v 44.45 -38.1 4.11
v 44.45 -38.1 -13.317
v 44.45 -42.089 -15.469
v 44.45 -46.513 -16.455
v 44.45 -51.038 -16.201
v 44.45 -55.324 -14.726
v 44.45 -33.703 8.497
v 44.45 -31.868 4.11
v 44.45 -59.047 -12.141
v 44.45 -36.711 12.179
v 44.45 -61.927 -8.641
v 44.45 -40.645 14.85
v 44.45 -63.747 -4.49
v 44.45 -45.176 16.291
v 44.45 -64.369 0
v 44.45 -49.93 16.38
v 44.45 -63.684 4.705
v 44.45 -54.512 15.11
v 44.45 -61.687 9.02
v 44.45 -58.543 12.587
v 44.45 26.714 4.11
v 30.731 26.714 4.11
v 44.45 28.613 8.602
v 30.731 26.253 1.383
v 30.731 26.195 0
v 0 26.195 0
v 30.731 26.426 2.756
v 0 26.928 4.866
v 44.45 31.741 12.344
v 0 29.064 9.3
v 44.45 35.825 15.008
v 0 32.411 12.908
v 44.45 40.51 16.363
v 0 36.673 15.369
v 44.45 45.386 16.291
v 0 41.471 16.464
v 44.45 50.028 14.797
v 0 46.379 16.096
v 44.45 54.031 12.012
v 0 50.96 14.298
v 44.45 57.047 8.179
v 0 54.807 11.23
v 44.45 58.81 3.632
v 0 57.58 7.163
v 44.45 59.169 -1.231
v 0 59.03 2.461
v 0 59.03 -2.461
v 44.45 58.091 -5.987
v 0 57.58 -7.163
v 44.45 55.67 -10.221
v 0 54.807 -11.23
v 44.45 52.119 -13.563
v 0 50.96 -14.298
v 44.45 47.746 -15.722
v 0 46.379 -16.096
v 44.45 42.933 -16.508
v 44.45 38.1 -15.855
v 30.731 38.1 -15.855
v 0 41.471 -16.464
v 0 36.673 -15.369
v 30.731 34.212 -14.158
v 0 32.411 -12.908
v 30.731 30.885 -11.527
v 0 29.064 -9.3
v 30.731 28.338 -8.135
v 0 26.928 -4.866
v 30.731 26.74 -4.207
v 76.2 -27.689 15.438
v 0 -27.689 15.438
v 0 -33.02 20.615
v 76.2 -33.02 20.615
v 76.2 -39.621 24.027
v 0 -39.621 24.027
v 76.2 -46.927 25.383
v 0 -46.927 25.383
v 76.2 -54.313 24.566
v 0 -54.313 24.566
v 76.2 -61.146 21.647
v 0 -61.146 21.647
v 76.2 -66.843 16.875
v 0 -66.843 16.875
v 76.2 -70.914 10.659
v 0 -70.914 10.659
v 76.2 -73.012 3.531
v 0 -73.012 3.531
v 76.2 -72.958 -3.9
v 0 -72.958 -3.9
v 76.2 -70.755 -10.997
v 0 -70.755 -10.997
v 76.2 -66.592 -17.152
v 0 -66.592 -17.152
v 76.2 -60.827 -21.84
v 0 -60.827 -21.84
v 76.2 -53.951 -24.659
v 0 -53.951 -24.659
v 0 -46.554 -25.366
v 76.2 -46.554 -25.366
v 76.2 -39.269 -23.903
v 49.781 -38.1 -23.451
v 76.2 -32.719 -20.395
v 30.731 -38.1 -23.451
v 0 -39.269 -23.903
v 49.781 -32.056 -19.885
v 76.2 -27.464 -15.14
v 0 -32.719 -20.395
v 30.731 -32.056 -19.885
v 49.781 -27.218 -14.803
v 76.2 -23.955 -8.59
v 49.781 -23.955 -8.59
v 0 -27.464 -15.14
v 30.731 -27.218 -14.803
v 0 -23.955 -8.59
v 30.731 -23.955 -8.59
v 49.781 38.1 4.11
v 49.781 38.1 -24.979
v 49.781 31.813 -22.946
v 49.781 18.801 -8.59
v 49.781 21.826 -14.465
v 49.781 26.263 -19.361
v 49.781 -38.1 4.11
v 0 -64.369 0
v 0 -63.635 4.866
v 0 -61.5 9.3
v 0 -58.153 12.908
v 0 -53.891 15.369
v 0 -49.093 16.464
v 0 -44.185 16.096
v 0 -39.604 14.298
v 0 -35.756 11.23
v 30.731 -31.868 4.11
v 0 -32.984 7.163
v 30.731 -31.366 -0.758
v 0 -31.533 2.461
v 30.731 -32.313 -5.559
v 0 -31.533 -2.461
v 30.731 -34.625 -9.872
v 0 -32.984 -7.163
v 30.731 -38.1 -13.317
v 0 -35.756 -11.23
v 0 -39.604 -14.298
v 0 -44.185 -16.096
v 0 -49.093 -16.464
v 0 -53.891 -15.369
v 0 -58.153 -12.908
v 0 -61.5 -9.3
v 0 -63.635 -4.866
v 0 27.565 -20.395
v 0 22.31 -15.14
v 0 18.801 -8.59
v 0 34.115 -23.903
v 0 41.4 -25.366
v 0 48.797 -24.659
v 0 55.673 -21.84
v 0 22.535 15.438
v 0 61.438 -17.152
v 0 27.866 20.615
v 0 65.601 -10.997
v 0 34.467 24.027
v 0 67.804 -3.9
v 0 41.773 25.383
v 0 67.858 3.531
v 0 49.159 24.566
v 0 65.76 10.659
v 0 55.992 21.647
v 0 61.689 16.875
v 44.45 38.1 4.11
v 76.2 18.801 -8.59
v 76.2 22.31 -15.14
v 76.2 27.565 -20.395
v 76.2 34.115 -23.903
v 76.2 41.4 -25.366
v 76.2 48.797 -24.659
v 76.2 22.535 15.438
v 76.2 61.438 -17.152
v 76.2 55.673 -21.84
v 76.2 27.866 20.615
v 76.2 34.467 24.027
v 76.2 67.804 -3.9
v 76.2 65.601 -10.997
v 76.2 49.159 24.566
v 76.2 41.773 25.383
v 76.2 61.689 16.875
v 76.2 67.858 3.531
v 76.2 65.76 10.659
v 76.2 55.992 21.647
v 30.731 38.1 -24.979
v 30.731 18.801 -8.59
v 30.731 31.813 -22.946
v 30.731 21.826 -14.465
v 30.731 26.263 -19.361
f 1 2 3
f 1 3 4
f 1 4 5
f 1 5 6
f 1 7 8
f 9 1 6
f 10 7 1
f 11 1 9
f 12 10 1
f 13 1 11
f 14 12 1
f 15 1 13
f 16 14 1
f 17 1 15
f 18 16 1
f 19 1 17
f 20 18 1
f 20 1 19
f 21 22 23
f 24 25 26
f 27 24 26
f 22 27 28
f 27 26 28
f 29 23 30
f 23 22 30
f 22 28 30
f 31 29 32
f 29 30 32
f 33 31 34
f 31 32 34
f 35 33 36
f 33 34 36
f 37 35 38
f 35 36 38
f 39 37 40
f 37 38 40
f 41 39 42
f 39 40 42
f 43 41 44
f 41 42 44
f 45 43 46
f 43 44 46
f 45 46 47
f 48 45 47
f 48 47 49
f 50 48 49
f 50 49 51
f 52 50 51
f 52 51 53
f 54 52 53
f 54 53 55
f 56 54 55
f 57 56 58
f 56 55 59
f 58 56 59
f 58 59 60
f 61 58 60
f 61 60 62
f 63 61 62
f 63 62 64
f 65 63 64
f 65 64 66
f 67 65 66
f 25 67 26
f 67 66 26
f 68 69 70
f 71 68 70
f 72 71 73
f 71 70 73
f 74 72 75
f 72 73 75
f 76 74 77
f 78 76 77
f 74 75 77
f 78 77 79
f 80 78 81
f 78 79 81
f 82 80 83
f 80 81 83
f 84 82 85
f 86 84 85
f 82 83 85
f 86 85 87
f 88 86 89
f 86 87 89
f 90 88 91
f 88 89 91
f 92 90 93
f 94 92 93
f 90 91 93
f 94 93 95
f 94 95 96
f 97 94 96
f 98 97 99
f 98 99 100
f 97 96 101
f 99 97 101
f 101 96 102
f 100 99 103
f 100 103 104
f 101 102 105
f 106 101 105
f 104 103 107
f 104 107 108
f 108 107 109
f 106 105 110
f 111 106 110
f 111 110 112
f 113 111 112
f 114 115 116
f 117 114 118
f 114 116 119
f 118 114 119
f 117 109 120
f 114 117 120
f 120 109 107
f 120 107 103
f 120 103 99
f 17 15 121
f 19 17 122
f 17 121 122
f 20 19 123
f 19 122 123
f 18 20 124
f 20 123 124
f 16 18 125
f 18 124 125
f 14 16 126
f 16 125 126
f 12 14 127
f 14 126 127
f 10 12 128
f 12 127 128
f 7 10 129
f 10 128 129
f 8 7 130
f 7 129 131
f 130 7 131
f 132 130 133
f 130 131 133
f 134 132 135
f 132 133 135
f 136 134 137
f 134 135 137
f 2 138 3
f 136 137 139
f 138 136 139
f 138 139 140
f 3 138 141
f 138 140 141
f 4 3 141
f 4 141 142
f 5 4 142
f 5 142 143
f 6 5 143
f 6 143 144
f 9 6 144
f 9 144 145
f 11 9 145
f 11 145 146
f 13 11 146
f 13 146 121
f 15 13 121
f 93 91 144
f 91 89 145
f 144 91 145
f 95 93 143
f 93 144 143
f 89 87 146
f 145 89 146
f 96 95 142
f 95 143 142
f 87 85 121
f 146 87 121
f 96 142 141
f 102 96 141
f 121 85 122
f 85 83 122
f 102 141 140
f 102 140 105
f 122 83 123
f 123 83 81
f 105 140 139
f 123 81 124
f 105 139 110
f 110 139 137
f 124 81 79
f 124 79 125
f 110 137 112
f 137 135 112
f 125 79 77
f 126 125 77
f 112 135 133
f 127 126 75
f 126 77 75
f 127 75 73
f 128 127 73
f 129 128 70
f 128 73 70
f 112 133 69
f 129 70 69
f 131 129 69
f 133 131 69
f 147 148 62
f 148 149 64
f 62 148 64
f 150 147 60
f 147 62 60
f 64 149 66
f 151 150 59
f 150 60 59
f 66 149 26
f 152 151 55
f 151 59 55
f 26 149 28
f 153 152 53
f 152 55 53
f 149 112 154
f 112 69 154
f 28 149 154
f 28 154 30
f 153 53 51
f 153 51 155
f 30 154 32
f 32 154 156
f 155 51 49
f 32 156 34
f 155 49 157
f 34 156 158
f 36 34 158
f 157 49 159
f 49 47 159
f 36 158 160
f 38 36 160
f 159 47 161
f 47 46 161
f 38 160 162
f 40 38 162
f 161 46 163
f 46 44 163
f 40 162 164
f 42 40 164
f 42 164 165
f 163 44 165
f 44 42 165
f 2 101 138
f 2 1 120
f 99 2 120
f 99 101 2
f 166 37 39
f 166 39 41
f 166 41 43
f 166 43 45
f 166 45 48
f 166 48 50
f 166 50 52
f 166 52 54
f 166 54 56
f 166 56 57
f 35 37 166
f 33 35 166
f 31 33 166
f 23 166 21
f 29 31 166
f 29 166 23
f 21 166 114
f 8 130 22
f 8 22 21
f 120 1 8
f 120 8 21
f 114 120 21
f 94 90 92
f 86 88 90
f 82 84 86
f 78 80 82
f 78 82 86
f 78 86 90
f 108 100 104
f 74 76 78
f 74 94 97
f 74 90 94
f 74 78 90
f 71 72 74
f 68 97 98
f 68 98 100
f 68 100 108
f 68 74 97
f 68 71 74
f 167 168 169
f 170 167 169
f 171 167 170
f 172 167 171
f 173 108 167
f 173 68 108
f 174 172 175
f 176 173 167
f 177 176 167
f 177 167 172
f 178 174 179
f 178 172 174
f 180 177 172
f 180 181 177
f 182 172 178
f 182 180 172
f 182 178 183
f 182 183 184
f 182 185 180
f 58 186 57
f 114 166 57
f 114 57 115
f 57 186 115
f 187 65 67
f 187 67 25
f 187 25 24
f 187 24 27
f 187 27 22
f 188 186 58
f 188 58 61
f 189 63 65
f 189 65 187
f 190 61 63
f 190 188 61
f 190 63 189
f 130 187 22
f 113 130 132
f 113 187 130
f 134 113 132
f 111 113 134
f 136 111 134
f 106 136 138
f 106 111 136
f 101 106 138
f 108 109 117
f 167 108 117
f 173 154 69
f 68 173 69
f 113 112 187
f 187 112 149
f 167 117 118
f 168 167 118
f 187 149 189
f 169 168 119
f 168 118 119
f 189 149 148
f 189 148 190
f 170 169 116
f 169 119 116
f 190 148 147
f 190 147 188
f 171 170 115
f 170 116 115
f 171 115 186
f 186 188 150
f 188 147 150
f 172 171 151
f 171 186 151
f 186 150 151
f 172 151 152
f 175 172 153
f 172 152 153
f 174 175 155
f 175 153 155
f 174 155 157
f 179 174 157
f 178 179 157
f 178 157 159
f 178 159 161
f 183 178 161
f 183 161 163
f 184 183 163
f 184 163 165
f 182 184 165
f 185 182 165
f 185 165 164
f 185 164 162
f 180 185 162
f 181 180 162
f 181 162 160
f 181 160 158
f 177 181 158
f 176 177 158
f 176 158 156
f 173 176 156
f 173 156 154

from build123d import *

# Parameters (mm, degrees)
F1_DEPTH  = 76.2
F2_W      = 19.05
F2_H      = 76.2
F3_DEPTH  = 25.4
F3_FACE_W = 19.05
F3_FACE_H = 76.2
F4_DEPTH  = 38.1
F5_R      = 16.51
F6_DEPTH  = 44.45


with BuildPart() as f1:
    # F0 (on Right) → F1 (new body)
    with BuildSketch(Plane.YZ):
        with BuildLine():
            Line((22.535029, 15.43837), (-27.689042, 15.43837))
            ThreePointArc((-27.689042, 15.43837), (-72.957545, -3.900003), (-23.955365, -8.59003))
            Line((-23.955365, -8.59003), (18.801352, -8.59003))
            ThreePointArc((18.801352, -8.59003), (67.803532, -3.900003), (22.535029, 15.43837))
        make_face()
    extrude(amount=F1_DEPTH)

    # F2 (on face) → F3 (join)
    with BuildSketch(Plane(origin=(0, 0, -8.59003), x_dir=(1, 0, 0), z_dir=(0, 0, -1))):
        with Locations((40.256006, 0)):
            Rectangle(F2_W, F2_H)
    extrude(amount=F3_DEPTH)

    # F3_face (on face) → F4 (cut)
    with BuildSketch(Plane(origin=(40.256006, 0, -33.99003), x_dir=(1, 0, 0), z_dir=(0, 0, -1))):
        Rectangle(F3_FACE_W, F3_FACE_H)
    extrude(amount=-F4_DEPTH, mode=Mode.SUBTRACT)

    # F5 (on face) → F6 (cut)
    with BuildSketch(Plane(origin=(0, 0, 0), x_dir=(0, -1, 0), z_dir=(-1, 0, 0))):
        with Locations((-42.704728, 0)):
            Circle(F5_R)
        with Locations((47.858741, 0)):
            Circle(F5_R)
    extrude(amount=-F6_DEPTH, mode=Mode.SUBTRACT)


solid = f1.part
